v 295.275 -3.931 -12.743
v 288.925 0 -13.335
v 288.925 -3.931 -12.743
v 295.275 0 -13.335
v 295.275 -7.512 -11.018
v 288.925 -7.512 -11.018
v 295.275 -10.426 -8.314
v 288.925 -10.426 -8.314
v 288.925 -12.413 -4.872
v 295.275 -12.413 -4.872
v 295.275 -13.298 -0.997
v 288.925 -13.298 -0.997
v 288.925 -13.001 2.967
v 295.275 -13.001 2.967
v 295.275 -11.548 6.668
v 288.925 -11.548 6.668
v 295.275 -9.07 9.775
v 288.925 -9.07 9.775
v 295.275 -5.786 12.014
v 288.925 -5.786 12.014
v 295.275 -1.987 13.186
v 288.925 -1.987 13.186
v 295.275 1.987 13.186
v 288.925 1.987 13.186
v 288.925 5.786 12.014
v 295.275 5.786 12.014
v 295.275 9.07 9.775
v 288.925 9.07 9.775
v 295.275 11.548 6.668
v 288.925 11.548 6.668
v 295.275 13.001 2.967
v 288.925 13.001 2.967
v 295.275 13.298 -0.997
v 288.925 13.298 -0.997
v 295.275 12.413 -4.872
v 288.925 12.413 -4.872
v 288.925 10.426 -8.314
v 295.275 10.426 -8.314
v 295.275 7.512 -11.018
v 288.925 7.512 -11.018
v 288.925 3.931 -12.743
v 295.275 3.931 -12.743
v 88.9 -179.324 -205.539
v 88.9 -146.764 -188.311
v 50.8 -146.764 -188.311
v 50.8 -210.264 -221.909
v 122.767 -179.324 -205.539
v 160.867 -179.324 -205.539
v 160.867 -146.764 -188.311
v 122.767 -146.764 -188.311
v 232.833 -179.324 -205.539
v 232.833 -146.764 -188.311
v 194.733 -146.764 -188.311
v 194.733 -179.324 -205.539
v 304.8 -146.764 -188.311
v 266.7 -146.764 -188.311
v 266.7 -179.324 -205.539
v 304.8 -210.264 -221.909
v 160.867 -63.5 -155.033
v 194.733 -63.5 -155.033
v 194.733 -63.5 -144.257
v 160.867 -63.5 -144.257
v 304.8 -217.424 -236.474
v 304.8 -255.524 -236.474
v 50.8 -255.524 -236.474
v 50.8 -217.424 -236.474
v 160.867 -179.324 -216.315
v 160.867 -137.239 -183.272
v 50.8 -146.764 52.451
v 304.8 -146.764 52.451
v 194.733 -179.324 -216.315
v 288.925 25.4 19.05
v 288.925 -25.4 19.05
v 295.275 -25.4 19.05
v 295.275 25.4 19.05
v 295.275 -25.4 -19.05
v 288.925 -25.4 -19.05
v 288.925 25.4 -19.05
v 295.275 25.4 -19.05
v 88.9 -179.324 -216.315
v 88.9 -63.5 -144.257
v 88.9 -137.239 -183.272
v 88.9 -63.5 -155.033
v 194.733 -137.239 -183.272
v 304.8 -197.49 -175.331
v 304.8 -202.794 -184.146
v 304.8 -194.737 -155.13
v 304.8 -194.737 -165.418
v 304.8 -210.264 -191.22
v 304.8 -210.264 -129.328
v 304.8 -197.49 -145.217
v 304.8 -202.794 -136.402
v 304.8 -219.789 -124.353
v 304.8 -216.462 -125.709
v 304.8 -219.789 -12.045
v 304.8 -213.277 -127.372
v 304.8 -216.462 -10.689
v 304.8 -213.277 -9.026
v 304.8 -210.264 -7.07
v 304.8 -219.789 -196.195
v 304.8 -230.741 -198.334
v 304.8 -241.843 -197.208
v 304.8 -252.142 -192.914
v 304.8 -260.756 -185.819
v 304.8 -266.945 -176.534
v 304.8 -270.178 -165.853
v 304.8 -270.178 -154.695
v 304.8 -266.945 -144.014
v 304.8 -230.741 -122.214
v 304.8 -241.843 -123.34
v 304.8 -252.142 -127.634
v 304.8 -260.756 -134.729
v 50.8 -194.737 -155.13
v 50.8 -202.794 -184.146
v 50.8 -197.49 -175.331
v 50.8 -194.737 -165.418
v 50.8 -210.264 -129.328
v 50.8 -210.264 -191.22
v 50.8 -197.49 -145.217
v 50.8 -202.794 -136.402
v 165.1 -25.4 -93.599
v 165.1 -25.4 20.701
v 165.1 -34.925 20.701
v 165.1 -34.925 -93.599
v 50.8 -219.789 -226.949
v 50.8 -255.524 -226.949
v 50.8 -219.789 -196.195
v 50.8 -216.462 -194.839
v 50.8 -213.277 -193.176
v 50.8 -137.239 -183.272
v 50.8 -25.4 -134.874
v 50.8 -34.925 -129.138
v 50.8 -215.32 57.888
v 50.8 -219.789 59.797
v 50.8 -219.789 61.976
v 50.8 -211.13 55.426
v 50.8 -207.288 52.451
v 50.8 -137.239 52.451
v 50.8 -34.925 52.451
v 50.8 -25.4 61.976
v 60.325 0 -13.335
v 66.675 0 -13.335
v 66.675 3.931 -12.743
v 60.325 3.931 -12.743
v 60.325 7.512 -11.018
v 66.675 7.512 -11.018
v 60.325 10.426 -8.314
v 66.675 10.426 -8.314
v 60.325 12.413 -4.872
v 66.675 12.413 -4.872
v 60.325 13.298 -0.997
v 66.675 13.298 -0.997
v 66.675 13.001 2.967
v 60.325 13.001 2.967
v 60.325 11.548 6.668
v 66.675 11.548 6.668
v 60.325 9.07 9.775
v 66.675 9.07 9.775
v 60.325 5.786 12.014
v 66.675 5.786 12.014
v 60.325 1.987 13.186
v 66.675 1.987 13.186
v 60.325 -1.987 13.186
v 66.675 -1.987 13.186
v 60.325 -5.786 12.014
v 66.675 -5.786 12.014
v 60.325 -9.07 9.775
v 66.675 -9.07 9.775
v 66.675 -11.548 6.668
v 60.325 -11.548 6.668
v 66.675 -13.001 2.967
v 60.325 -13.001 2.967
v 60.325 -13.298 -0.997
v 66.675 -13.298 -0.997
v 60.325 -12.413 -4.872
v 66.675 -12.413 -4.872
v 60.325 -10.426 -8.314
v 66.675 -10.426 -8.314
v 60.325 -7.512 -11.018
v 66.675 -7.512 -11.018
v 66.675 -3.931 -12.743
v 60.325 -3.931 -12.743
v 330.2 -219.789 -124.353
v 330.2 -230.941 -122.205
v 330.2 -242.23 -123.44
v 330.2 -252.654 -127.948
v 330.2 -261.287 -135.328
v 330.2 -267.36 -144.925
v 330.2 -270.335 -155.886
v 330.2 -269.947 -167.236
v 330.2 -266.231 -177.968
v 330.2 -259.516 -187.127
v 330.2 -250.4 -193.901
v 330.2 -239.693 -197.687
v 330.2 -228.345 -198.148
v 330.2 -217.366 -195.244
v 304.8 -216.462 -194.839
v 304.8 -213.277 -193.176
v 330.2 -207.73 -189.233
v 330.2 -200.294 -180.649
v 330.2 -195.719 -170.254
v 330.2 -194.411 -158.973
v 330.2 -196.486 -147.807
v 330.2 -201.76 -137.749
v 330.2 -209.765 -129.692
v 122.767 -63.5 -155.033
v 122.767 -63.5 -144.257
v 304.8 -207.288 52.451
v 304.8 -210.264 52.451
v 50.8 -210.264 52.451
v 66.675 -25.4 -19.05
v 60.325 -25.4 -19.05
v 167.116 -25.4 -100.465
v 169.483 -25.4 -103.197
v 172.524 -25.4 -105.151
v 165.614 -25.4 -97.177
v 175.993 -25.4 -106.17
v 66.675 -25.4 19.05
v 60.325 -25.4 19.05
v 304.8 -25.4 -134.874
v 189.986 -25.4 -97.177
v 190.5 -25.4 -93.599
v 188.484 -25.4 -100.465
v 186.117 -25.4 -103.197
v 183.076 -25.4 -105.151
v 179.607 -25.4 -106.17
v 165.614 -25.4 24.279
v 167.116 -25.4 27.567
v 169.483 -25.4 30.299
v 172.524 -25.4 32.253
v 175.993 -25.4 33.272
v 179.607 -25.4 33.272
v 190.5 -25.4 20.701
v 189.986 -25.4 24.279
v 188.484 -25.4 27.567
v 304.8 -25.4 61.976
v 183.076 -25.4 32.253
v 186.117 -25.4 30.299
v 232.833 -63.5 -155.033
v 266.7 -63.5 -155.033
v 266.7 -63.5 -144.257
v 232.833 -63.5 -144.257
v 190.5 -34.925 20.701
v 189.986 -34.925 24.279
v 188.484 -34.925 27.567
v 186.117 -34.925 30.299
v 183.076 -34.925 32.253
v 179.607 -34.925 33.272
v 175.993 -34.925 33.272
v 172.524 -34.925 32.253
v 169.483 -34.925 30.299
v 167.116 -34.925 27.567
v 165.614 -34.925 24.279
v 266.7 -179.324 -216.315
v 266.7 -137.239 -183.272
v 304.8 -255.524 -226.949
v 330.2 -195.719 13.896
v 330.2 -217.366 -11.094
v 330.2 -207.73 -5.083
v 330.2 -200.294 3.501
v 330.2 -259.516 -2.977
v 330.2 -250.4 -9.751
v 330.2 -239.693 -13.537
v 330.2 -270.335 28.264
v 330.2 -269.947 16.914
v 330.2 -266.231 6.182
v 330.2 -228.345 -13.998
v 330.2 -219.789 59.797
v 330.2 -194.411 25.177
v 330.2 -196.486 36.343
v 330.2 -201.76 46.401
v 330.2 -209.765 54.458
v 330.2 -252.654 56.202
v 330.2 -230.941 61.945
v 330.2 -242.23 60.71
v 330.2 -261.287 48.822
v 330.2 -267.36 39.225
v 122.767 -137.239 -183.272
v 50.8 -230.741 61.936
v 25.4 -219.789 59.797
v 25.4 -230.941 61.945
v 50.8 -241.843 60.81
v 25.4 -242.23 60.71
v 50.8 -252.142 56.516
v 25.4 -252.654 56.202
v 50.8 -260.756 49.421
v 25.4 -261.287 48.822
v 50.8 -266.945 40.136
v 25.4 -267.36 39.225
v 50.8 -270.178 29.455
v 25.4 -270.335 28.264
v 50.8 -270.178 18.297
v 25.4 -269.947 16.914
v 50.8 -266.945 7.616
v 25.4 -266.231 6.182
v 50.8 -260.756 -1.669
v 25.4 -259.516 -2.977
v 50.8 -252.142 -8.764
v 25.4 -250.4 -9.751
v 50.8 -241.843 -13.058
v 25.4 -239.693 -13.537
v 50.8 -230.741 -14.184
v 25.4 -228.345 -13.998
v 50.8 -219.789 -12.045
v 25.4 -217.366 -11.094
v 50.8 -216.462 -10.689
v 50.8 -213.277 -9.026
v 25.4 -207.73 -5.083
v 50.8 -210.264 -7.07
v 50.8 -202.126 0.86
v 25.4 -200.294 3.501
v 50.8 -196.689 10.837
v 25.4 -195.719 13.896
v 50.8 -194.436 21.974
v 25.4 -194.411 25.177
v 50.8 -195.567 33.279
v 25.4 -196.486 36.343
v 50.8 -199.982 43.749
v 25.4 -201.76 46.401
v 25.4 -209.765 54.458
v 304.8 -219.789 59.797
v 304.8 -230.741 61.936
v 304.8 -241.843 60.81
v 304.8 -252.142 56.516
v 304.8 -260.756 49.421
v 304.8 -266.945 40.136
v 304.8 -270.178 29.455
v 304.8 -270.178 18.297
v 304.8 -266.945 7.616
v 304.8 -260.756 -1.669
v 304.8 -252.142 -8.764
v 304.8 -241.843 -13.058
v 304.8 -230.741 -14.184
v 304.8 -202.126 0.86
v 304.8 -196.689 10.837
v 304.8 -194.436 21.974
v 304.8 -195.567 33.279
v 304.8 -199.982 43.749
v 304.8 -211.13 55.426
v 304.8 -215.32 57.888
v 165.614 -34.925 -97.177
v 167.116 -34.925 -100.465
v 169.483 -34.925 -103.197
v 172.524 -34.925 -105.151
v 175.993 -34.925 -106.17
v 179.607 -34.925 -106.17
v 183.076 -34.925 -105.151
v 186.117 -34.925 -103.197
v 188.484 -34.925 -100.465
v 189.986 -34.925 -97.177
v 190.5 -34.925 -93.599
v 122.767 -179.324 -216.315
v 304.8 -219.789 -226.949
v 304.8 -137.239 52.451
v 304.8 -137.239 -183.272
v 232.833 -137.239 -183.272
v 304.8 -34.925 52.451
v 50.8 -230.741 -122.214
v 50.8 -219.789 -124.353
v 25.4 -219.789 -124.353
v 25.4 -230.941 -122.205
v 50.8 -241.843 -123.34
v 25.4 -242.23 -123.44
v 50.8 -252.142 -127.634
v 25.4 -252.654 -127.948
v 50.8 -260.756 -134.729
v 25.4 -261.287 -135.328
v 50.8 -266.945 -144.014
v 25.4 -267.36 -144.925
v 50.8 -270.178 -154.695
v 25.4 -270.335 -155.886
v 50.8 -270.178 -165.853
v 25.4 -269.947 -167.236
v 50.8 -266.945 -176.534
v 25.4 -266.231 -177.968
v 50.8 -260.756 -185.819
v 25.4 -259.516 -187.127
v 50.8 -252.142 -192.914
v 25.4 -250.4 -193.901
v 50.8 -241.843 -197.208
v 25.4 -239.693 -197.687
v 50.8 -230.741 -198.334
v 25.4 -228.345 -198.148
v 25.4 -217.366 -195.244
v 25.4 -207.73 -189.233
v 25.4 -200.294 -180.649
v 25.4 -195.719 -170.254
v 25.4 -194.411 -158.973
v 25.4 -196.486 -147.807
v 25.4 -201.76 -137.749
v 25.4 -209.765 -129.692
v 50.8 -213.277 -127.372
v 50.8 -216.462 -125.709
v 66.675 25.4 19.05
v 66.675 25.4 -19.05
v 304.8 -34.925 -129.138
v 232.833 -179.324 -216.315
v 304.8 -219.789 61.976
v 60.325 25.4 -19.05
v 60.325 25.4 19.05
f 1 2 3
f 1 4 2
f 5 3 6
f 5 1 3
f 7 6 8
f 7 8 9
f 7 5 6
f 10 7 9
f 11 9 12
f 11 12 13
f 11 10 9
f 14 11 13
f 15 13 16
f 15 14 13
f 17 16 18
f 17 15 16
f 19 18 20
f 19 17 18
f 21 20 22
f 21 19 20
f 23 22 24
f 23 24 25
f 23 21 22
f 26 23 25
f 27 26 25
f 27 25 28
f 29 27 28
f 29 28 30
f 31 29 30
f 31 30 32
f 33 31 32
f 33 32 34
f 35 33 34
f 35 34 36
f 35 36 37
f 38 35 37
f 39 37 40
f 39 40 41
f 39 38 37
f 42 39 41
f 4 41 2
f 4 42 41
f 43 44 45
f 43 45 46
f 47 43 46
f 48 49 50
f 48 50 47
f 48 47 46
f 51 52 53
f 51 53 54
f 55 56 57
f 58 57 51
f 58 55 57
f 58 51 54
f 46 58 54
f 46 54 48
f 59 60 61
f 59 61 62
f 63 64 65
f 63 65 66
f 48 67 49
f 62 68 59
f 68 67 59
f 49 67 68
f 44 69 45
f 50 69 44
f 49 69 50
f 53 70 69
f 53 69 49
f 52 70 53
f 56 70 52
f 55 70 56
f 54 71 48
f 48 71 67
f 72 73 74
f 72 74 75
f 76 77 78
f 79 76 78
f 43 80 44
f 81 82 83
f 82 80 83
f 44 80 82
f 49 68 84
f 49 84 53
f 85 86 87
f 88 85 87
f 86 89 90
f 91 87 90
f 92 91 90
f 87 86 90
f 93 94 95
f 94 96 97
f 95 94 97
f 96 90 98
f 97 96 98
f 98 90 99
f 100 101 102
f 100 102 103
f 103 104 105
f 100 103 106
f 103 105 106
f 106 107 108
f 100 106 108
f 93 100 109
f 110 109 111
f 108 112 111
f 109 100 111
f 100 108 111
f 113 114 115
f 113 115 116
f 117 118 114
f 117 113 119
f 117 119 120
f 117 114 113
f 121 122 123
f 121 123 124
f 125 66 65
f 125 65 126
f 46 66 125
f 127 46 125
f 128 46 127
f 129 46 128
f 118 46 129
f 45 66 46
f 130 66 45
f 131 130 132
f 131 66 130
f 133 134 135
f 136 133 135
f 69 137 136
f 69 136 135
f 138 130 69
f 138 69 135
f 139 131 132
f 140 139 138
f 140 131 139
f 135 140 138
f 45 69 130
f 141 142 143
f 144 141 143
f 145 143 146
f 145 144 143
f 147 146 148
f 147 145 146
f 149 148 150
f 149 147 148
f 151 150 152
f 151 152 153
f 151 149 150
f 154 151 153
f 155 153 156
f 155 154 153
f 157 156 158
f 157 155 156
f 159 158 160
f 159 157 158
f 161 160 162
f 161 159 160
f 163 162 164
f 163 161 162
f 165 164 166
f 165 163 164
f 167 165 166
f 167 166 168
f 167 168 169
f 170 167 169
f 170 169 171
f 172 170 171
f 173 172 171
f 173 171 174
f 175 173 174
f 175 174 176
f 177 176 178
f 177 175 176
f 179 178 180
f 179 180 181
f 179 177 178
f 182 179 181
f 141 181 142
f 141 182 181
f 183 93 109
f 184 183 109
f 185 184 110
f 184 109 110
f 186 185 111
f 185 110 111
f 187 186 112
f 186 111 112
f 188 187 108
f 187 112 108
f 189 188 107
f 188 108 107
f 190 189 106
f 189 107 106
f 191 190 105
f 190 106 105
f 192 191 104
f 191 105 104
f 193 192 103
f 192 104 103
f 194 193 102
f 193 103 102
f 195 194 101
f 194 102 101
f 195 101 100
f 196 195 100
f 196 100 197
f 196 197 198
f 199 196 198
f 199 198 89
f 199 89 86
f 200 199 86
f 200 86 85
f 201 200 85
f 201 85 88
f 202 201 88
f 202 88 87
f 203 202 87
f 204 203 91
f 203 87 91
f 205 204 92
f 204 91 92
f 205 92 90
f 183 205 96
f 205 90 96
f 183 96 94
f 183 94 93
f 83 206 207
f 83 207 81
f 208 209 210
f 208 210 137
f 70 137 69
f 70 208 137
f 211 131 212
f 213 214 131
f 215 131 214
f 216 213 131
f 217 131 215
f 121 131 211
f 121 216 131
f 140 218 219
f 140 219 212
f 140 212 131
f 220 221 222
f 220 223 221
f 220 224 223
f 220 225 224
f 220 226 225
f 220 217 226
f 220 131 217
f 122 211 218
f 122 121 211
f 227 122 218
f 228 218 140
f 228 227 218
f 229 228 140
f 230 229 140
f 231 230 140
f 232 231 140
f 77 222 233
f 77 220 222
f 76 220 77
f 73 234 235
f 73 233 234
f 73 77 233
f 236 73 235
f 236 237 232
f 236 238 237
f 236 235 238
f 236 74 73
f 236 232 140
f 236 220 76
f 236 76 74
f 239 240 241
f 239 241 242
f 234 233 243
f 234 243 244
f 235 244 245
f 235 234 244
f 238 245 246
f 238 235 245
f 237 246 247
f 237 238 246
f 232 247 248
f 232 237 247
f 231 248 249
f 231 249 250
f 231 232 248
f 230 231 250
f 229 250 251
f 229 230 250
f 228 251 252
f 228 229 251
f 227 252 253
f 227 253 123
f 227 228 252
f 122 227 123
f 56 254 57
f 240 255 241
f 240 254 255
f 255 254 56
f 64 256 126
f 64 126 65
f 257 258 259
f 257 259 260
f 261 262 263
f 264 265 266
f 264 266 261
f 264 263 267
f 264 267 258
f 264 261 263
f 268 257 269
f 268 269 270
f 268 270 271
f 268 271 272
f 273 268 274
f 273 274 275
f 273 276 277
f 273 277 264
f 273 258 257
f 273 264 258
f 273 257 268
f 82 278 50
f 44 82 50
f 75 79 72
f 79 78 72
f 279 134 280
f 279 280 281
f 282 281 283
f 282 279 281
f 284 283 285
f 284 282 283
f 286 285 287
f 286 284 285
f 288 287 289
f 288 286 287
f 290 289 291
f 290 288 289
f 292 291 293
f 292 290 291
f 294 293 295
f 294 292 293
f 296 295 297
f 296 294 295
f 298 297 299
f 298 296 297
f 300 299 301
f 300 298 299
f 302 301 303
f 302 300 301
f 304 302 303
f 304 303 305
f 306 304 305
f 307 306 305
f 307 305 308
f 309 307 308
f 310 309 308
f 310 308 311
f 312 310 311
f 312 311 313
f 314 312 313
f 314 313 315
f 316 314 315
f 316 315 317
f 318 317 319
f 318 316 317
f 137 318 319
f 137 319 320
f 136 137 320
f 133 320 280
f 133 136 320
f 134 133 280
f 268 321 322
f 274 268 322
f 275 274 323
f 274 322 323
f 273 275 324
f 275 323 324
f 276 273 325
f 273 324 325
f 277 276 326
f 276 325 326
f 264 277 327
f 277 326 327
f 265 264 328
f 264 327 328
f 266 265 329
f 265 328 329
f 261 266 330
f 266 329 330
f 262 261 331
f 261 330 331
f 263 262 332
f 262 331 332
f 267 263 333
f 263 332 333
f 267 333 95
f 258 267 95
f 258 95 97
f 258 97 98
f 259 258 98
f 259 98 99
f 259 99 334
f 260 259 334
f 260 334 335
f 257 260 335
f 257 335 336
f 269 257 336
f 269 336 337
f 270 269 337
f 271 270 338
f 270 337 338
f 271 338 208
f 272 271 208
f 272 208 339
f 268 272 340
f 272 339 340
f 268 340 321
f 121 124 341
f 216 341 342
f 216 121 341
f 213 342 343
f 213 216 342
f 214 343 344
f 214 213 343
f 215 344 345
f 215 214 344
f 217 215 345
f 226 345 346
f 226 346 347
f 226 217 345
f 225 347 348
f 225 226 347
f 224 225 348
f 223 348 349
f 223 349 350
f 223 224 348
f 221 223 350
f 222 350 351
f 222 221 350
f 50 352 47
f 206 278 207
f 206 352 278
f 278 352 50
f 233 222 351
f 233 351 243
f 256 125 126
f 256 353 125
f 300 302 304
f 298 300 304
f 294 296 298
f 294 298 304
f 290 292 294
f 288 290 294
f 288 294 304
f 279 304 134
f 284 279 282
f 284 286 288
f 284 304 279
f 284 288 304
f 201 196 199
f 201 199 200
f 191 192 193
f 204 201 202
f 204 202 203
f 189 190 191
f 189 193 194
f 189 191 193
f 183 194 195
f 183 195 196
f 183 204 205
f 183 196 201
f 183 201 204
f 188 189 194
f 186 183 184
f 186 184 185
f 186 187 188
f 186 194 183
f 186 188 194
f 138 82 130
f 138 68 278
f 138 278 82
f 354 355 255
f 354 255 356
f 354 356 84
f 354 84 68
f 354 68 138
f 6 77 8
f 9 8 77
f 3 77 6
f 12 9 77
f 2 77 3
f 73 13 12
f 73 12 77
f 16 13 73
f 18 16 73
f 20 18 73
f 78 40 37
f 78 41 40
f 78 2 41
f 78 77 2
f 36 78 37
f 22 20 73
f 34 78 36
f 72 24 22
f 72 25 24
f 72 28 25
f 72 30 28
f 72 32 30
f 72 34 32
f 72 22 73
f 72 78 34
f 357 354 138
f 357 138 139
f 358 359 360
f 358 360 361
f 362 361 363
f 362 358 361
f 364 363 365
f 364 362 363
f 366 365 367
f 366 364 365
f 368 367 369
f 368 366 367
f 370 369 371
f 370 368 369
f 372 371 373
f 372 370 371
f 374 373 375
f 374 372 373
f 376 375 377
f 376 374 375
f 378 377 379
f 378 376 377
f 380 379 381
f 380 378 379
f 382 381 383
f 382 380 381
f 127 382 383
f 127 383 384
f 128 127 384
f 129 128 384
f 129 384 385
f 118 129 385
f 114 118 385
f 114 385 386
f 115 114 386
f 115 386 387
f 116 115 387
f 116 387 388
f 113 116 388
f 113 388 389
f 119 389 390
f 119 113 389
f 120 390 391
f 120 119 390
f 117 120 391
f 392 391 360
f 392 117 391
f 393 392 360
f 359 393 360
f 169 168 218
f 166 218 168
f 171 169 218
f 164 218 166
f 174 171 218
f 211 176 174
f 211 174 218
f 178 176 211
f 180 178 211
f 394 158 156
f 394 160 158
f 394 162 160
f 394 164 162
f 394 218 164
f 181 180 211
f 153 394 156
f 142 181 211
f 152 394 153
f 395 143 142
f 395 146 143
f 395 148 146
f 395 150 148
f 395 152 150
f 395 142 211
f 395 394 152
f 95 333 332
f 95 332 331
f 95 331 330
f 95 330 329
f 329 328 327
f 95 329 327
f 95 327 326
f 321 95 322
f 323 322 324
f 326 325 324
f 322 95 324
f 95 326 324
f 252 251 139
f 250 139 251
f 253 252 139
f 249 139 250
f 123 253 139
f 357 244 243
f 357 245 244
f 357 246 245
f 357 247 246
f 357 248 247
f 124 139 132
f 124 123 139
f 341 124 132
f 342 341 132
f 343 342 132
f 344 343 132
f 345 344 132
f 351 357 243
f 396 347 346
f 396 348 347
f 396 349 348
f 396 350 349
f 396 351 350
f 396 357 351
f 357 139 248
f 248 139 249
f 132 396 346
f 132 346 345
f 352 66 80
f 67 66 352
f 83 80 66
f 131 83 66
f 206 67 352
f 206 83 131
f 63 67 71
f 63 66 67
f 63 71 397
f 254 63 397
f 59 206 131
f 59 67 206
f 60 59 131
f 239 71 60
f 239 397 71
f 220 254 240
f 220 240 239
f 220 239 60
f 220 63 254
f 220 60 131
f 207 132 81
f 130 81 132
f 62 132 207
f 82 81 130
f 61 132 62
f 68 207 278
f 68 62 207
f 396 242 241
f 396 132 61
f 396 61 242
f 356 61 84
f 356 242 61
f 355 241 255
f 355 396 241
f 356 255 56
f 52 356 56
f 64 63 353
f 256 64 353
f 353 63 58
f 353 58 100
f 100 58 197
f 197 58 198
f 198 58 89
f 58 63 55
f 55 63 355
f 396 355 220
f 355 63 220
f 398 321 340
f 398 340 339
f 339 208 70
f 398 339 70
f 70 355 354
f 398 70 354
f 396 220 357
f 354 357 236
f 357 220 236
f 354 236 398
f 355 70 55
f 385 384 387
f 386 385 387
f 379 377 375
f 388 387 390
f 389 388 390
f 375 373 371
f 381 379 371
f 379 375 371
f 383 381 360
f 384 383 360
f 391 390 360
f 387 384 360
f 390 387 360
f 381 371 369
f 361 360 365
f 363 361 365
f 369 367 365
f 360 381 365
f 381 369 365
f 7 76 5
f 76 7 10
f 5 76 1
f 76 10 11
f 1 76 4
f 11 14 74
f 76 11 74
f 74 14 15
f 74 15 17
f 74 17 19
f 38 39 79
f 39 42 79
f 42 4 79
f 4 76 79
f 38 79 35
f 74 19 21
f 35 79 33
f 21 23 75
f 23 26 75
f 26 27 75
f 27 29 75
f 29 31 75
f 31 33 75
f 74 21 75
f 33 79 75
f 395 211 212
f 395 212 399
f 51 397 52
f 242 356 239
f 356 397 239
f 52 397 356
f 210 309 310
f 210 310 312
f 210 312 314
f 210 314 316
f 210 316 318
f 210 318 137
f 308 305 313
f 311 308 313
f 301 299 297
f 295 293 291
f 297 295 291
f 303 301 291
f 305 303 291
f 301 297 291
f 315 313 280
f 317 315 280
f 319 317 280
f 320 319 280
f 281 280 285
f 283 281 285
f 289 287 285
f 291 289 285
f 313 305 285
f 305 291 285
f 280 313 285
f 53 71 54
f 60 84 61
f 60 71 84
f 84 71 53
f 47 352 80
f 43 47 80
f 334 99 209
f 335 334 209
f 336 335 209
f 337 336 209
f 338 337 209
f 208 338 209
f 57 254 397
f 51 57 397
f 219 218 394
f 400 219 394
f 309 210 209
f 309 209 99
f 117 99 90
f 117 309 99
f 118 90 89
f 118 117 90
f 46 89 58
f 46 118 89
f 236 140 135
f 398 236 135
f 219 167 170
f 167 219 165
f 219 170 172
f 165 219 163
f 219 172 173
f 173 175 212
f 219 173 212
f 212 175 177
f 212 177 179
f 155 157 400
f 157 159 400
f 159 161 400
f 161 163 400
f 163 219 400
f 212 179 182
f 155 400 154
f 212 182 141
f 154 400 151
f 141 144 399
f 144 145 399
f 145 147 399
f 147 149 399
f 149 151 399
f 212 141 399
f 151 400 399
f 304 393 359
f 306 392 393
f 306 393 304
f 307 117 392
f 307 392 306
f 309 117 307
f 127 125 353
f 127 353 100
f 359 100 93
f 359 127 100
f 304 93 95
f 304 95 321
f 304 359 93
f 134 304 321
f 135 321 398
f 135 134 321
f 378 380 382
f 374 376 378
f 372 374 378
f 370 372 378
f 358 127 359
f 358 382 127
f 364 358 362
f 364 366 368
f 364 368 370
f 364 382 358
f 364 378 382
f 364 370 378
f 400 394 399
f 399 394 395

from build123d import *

# Parameters (mm, degrees)
SKETCH2_W           = 38.1
SKETCH2_H           = 50.8
SKETCH2_R           = 13.335
BOSS_EXTRUDE2_DEPTH = 3.175
SKETCH4_W           = 38.1
SKETCH4_H           = 50.8
SKETCH4_R           = 13.335
BOSS_EXTRUDE3_DEPTH = 3.175
BOSS_EXTRUDE4_DEPTH = 127
CUT_EXTRUDE3_DEPTH  = 127
BOSS_EXTRUDE7_DEPTH = 127
SKETCH16_R          = 38.1
BOSS_EXTRUDE8_DEPTH = 25.4
CUT_EXTRUDE6_REACH  = 522.886
SKETCH19_W          = 33.866666667
SKETCH19_H          = 115.824
SKETCH19_W_2        = 33.866666666
CUT_EXTRUDE7_DEPTH  = 34.925


with BuildPart() as part:
    # Sketch2 → Boss-Extrude2 (new, symmetric)
    with BuildSketch(Plane(origin=(63.5, 0, 0), x_dir=(0, 0, -1), z_dir=(1, 0, 0))):
        Rectangle(SKETCH2_W, SKETCH2_H)
        Circle(SKETCH2_R, mode=Mode.SUBTRACT)
    extrude(amount=BOSS_EXTRUDE2_DEPTH, both=True)



with BuildPart() as body_2:
    # Sketch4 → Boss-Extrude3 (new, symmetric)
    with BuildSketch(Plane(origin=(292.1, 0, -263.652), x_dir=(0, 0, 1), z_dir=(-1, 0, 0))):
        with Locations((263.652, 0)):
            Rectangle(SKETCH4_W, SKETCH4_H)
        with Locations(Location((263.652, 0, 0), (0, 0, 180))):
            Circle(SKETCH4_R, mode=Mode.SUBTRACT)
    extrude(amount=BOSS_EXTRUDE3_DEPTH, both=True)


with BuildPart() as part_1:
    add(part.part)

    add(body_2.part)  # Boss-Extrude4 merges body 2
    # Sketch6 → Boss-Extrude4 (add, symmetric)
    with BuildSketch(Plane(origin=(177.8, 0, 0), x_dir=(0, 0, -1), z_dir=(1, 0, 0))):
        Polygon((-19.05, -25.4), (-61.976, -25.4), (-61.976, -255.524), (236.474, -255.524), (236.474, -217.424), (134.874, -25.4), (19.05, -25.4), align=None)
    extrude(amount=BOSS_EXTRUDE4_DEPTH, both=True)

    # Sketch13 → Cut-Extrude3 (cut, symmetric)
    with BuildSketch(Plane(origin=(177.8, 0, 0), x_dir=(0, 0, -1), z_dir=(1, 0, 0))):
        Polygon((-52.451, -34.925), (129.137596743, -34.925), (226.949, -219.788552156), (226.949, -255.524), (-61.976, -255.524), (-61.976, -219.788552156), (-52.451, -219.788552156), align=None)
    extrude(amount=CUT_EXTRUDE3_DEPTH, both=True, mode=Mode.SUBTRACT)

    # Sketch14 → Boss-Extrude7 (add, symmetric)
    with BuildSketch(Plane(origin=(177.8, 0, 0), x_dir=(0, 0, -1), z_dir=(1, 0, 0))):
        Polygon((226.949, -219.788552156), (-52.451, -219.788552156), (-52.451, -210.263552156), (221.90931746, -210.263552156), align=None)
        Polygon((-52.451, -146.763552156), (188.311433862, -146.763552156), (183.271751323, -137.238552156), (-52.451, -137.238552156), align=None)
    extrude(amount=BOSS_EXTRUDE7_DEPTH, both=True)

    # Sketch16 → Boss-Extrude8 (add)
    with BuildSketch(Plane(origin=(304.8, 0, 0), x_dir=(0, 0, -1), z_dir=(1, 0, 0))):
        with Locations(Location((-23.876, -232.488552156, 0), (0, 0, 160.528779366))):
            Circle(SKETCH16_R)
        with Locations(Location((160.274, -232.488552156, 0), (0, 0, 160.528779366))):
            Circle(SKETCH16_R)
    boss_extrude8 = extrude(amount=BOSS_EXTRUDE8_DEPTH)

    # Mirror1: Boss-Extrude8 across plane
    add(boss_extrude8.mirror(Plane(origin=(177.8, 0, 0), x_dir=(0, 0, 1), z_dir=(1, 0, 0))))

    # Cut-Extrude6: up to this plane
    cut_extrude6_end = Plane(origin=(50.8, -34.925, -129.137596743), z_dir=(0, 0.46767282988430103, -0.8839016484813284))
    # Sketch19 → Cut-Extrude6 (cut, up to the surface)
    with BuildSketch(Plane(origin=(0, 0, -236.474), x_dir=(-1, 0, 0), z_dir=(0, 0, -1)), mode=Mode.PRIVATE) as cut_extrude6_sk1:
        with Locations((-249.766666666, -121.412)):
            Rectangle(SKETCH19_W, SKETCH19_H)
    cut_extrude6_tool1 = split(extrude(cut_extrude6_sk1.sketch, amount=-CUT_EXTRUDE6_REACH, mode=Mode.PRIVATE), bisect_by=cut_extrude6_end, keep=Keep.BOTH, mode=Mode.PRIVATE)
    add(cut_extrude6_tool1.solids().sort_by_distance((249.766667, -121.412, -236.474))[0], mode=Mode.SUBTRACT)
    # Sketch19 → Cut-Extrude6 (cut, up to the surface)
    with BuildSketch(Plane(origin=(0, 0, -236.474), x_dir=(-1, 0, 0), z_dir=(0, 0, -1)), mode=Mode.PRIVATE) as cut_extrude6_sk2:
        with Locations((-177.8, -121.412)):
            Rectangle(SKETCH19_W_2, SKETCH19_H)
    cut_extrude6_tool2 = split(extrude(cut_extrude6_sk2.sketch, amount=-CUT_EXTRUDE6_REACH, mode=Mode.PRIVATE), bisect_by=cut_extrude6_end, keep=Keep.BOTH, mode=Mode.PRIVATE)
    add(cut_extrude6_tool2.solids().sort_by_distance((177.8, -121.412, -236.474))[0], mode=Mode.SUBTRACT)
    # Sketch19 → Cut-Extrude6 (cut, up to the surface)
    with BuildSketch(Plane(origin=(0, 0, -236.474), x_dir=(-1, 0, 0), z_dir=(0, 0, -1)), mode=Mode.PRIVATE) as cut_extrude6_sk3:
        with Locations((-105.833333334, -121.412)):
            Rectangle(SKETCH19_W, SKETCH19_H)
    cut_extrude6_tool3 = split(extrude(cut_extrude6_sk3.sketch, amount=-CUT_EXTRUDE6_REACH, mode=Mode.PRIVATE), bisect_by=cut_extrude6_end, keep=Keep.BOTH, mode=Mode.PRIVATE)
    add(cut_extrude6_tool3.solids().sort_by_distance((105.833333, -121.412, -236.474))[0], mode=Mode.SUBTRACT)

    # Sketch20 → Cut-Extrude7 (cut)
    with BuildSketch(Plane(origin=(0, 0, 0), x_dir=(1, 0, 0), z_dir=(0, 1, 0))):
        with BuildLine():
            Line((190.5, 93.599), (190.5, -20.701))
            ThreePointArc((190.5, -20.701), (177.8, -33.401), (165.1, -20.701))
            Line((165.1, -20.701), (165.1, 93.599))
            ThreePointArc((165.1, 93.599), (177.8, 106.299), (190.5, 93.599))
        make_face()
    extrude(amount=-CUT_EXTRUDE7_DEPTH, mode=Mode.SUBTRACT)


solid = part_1.part
